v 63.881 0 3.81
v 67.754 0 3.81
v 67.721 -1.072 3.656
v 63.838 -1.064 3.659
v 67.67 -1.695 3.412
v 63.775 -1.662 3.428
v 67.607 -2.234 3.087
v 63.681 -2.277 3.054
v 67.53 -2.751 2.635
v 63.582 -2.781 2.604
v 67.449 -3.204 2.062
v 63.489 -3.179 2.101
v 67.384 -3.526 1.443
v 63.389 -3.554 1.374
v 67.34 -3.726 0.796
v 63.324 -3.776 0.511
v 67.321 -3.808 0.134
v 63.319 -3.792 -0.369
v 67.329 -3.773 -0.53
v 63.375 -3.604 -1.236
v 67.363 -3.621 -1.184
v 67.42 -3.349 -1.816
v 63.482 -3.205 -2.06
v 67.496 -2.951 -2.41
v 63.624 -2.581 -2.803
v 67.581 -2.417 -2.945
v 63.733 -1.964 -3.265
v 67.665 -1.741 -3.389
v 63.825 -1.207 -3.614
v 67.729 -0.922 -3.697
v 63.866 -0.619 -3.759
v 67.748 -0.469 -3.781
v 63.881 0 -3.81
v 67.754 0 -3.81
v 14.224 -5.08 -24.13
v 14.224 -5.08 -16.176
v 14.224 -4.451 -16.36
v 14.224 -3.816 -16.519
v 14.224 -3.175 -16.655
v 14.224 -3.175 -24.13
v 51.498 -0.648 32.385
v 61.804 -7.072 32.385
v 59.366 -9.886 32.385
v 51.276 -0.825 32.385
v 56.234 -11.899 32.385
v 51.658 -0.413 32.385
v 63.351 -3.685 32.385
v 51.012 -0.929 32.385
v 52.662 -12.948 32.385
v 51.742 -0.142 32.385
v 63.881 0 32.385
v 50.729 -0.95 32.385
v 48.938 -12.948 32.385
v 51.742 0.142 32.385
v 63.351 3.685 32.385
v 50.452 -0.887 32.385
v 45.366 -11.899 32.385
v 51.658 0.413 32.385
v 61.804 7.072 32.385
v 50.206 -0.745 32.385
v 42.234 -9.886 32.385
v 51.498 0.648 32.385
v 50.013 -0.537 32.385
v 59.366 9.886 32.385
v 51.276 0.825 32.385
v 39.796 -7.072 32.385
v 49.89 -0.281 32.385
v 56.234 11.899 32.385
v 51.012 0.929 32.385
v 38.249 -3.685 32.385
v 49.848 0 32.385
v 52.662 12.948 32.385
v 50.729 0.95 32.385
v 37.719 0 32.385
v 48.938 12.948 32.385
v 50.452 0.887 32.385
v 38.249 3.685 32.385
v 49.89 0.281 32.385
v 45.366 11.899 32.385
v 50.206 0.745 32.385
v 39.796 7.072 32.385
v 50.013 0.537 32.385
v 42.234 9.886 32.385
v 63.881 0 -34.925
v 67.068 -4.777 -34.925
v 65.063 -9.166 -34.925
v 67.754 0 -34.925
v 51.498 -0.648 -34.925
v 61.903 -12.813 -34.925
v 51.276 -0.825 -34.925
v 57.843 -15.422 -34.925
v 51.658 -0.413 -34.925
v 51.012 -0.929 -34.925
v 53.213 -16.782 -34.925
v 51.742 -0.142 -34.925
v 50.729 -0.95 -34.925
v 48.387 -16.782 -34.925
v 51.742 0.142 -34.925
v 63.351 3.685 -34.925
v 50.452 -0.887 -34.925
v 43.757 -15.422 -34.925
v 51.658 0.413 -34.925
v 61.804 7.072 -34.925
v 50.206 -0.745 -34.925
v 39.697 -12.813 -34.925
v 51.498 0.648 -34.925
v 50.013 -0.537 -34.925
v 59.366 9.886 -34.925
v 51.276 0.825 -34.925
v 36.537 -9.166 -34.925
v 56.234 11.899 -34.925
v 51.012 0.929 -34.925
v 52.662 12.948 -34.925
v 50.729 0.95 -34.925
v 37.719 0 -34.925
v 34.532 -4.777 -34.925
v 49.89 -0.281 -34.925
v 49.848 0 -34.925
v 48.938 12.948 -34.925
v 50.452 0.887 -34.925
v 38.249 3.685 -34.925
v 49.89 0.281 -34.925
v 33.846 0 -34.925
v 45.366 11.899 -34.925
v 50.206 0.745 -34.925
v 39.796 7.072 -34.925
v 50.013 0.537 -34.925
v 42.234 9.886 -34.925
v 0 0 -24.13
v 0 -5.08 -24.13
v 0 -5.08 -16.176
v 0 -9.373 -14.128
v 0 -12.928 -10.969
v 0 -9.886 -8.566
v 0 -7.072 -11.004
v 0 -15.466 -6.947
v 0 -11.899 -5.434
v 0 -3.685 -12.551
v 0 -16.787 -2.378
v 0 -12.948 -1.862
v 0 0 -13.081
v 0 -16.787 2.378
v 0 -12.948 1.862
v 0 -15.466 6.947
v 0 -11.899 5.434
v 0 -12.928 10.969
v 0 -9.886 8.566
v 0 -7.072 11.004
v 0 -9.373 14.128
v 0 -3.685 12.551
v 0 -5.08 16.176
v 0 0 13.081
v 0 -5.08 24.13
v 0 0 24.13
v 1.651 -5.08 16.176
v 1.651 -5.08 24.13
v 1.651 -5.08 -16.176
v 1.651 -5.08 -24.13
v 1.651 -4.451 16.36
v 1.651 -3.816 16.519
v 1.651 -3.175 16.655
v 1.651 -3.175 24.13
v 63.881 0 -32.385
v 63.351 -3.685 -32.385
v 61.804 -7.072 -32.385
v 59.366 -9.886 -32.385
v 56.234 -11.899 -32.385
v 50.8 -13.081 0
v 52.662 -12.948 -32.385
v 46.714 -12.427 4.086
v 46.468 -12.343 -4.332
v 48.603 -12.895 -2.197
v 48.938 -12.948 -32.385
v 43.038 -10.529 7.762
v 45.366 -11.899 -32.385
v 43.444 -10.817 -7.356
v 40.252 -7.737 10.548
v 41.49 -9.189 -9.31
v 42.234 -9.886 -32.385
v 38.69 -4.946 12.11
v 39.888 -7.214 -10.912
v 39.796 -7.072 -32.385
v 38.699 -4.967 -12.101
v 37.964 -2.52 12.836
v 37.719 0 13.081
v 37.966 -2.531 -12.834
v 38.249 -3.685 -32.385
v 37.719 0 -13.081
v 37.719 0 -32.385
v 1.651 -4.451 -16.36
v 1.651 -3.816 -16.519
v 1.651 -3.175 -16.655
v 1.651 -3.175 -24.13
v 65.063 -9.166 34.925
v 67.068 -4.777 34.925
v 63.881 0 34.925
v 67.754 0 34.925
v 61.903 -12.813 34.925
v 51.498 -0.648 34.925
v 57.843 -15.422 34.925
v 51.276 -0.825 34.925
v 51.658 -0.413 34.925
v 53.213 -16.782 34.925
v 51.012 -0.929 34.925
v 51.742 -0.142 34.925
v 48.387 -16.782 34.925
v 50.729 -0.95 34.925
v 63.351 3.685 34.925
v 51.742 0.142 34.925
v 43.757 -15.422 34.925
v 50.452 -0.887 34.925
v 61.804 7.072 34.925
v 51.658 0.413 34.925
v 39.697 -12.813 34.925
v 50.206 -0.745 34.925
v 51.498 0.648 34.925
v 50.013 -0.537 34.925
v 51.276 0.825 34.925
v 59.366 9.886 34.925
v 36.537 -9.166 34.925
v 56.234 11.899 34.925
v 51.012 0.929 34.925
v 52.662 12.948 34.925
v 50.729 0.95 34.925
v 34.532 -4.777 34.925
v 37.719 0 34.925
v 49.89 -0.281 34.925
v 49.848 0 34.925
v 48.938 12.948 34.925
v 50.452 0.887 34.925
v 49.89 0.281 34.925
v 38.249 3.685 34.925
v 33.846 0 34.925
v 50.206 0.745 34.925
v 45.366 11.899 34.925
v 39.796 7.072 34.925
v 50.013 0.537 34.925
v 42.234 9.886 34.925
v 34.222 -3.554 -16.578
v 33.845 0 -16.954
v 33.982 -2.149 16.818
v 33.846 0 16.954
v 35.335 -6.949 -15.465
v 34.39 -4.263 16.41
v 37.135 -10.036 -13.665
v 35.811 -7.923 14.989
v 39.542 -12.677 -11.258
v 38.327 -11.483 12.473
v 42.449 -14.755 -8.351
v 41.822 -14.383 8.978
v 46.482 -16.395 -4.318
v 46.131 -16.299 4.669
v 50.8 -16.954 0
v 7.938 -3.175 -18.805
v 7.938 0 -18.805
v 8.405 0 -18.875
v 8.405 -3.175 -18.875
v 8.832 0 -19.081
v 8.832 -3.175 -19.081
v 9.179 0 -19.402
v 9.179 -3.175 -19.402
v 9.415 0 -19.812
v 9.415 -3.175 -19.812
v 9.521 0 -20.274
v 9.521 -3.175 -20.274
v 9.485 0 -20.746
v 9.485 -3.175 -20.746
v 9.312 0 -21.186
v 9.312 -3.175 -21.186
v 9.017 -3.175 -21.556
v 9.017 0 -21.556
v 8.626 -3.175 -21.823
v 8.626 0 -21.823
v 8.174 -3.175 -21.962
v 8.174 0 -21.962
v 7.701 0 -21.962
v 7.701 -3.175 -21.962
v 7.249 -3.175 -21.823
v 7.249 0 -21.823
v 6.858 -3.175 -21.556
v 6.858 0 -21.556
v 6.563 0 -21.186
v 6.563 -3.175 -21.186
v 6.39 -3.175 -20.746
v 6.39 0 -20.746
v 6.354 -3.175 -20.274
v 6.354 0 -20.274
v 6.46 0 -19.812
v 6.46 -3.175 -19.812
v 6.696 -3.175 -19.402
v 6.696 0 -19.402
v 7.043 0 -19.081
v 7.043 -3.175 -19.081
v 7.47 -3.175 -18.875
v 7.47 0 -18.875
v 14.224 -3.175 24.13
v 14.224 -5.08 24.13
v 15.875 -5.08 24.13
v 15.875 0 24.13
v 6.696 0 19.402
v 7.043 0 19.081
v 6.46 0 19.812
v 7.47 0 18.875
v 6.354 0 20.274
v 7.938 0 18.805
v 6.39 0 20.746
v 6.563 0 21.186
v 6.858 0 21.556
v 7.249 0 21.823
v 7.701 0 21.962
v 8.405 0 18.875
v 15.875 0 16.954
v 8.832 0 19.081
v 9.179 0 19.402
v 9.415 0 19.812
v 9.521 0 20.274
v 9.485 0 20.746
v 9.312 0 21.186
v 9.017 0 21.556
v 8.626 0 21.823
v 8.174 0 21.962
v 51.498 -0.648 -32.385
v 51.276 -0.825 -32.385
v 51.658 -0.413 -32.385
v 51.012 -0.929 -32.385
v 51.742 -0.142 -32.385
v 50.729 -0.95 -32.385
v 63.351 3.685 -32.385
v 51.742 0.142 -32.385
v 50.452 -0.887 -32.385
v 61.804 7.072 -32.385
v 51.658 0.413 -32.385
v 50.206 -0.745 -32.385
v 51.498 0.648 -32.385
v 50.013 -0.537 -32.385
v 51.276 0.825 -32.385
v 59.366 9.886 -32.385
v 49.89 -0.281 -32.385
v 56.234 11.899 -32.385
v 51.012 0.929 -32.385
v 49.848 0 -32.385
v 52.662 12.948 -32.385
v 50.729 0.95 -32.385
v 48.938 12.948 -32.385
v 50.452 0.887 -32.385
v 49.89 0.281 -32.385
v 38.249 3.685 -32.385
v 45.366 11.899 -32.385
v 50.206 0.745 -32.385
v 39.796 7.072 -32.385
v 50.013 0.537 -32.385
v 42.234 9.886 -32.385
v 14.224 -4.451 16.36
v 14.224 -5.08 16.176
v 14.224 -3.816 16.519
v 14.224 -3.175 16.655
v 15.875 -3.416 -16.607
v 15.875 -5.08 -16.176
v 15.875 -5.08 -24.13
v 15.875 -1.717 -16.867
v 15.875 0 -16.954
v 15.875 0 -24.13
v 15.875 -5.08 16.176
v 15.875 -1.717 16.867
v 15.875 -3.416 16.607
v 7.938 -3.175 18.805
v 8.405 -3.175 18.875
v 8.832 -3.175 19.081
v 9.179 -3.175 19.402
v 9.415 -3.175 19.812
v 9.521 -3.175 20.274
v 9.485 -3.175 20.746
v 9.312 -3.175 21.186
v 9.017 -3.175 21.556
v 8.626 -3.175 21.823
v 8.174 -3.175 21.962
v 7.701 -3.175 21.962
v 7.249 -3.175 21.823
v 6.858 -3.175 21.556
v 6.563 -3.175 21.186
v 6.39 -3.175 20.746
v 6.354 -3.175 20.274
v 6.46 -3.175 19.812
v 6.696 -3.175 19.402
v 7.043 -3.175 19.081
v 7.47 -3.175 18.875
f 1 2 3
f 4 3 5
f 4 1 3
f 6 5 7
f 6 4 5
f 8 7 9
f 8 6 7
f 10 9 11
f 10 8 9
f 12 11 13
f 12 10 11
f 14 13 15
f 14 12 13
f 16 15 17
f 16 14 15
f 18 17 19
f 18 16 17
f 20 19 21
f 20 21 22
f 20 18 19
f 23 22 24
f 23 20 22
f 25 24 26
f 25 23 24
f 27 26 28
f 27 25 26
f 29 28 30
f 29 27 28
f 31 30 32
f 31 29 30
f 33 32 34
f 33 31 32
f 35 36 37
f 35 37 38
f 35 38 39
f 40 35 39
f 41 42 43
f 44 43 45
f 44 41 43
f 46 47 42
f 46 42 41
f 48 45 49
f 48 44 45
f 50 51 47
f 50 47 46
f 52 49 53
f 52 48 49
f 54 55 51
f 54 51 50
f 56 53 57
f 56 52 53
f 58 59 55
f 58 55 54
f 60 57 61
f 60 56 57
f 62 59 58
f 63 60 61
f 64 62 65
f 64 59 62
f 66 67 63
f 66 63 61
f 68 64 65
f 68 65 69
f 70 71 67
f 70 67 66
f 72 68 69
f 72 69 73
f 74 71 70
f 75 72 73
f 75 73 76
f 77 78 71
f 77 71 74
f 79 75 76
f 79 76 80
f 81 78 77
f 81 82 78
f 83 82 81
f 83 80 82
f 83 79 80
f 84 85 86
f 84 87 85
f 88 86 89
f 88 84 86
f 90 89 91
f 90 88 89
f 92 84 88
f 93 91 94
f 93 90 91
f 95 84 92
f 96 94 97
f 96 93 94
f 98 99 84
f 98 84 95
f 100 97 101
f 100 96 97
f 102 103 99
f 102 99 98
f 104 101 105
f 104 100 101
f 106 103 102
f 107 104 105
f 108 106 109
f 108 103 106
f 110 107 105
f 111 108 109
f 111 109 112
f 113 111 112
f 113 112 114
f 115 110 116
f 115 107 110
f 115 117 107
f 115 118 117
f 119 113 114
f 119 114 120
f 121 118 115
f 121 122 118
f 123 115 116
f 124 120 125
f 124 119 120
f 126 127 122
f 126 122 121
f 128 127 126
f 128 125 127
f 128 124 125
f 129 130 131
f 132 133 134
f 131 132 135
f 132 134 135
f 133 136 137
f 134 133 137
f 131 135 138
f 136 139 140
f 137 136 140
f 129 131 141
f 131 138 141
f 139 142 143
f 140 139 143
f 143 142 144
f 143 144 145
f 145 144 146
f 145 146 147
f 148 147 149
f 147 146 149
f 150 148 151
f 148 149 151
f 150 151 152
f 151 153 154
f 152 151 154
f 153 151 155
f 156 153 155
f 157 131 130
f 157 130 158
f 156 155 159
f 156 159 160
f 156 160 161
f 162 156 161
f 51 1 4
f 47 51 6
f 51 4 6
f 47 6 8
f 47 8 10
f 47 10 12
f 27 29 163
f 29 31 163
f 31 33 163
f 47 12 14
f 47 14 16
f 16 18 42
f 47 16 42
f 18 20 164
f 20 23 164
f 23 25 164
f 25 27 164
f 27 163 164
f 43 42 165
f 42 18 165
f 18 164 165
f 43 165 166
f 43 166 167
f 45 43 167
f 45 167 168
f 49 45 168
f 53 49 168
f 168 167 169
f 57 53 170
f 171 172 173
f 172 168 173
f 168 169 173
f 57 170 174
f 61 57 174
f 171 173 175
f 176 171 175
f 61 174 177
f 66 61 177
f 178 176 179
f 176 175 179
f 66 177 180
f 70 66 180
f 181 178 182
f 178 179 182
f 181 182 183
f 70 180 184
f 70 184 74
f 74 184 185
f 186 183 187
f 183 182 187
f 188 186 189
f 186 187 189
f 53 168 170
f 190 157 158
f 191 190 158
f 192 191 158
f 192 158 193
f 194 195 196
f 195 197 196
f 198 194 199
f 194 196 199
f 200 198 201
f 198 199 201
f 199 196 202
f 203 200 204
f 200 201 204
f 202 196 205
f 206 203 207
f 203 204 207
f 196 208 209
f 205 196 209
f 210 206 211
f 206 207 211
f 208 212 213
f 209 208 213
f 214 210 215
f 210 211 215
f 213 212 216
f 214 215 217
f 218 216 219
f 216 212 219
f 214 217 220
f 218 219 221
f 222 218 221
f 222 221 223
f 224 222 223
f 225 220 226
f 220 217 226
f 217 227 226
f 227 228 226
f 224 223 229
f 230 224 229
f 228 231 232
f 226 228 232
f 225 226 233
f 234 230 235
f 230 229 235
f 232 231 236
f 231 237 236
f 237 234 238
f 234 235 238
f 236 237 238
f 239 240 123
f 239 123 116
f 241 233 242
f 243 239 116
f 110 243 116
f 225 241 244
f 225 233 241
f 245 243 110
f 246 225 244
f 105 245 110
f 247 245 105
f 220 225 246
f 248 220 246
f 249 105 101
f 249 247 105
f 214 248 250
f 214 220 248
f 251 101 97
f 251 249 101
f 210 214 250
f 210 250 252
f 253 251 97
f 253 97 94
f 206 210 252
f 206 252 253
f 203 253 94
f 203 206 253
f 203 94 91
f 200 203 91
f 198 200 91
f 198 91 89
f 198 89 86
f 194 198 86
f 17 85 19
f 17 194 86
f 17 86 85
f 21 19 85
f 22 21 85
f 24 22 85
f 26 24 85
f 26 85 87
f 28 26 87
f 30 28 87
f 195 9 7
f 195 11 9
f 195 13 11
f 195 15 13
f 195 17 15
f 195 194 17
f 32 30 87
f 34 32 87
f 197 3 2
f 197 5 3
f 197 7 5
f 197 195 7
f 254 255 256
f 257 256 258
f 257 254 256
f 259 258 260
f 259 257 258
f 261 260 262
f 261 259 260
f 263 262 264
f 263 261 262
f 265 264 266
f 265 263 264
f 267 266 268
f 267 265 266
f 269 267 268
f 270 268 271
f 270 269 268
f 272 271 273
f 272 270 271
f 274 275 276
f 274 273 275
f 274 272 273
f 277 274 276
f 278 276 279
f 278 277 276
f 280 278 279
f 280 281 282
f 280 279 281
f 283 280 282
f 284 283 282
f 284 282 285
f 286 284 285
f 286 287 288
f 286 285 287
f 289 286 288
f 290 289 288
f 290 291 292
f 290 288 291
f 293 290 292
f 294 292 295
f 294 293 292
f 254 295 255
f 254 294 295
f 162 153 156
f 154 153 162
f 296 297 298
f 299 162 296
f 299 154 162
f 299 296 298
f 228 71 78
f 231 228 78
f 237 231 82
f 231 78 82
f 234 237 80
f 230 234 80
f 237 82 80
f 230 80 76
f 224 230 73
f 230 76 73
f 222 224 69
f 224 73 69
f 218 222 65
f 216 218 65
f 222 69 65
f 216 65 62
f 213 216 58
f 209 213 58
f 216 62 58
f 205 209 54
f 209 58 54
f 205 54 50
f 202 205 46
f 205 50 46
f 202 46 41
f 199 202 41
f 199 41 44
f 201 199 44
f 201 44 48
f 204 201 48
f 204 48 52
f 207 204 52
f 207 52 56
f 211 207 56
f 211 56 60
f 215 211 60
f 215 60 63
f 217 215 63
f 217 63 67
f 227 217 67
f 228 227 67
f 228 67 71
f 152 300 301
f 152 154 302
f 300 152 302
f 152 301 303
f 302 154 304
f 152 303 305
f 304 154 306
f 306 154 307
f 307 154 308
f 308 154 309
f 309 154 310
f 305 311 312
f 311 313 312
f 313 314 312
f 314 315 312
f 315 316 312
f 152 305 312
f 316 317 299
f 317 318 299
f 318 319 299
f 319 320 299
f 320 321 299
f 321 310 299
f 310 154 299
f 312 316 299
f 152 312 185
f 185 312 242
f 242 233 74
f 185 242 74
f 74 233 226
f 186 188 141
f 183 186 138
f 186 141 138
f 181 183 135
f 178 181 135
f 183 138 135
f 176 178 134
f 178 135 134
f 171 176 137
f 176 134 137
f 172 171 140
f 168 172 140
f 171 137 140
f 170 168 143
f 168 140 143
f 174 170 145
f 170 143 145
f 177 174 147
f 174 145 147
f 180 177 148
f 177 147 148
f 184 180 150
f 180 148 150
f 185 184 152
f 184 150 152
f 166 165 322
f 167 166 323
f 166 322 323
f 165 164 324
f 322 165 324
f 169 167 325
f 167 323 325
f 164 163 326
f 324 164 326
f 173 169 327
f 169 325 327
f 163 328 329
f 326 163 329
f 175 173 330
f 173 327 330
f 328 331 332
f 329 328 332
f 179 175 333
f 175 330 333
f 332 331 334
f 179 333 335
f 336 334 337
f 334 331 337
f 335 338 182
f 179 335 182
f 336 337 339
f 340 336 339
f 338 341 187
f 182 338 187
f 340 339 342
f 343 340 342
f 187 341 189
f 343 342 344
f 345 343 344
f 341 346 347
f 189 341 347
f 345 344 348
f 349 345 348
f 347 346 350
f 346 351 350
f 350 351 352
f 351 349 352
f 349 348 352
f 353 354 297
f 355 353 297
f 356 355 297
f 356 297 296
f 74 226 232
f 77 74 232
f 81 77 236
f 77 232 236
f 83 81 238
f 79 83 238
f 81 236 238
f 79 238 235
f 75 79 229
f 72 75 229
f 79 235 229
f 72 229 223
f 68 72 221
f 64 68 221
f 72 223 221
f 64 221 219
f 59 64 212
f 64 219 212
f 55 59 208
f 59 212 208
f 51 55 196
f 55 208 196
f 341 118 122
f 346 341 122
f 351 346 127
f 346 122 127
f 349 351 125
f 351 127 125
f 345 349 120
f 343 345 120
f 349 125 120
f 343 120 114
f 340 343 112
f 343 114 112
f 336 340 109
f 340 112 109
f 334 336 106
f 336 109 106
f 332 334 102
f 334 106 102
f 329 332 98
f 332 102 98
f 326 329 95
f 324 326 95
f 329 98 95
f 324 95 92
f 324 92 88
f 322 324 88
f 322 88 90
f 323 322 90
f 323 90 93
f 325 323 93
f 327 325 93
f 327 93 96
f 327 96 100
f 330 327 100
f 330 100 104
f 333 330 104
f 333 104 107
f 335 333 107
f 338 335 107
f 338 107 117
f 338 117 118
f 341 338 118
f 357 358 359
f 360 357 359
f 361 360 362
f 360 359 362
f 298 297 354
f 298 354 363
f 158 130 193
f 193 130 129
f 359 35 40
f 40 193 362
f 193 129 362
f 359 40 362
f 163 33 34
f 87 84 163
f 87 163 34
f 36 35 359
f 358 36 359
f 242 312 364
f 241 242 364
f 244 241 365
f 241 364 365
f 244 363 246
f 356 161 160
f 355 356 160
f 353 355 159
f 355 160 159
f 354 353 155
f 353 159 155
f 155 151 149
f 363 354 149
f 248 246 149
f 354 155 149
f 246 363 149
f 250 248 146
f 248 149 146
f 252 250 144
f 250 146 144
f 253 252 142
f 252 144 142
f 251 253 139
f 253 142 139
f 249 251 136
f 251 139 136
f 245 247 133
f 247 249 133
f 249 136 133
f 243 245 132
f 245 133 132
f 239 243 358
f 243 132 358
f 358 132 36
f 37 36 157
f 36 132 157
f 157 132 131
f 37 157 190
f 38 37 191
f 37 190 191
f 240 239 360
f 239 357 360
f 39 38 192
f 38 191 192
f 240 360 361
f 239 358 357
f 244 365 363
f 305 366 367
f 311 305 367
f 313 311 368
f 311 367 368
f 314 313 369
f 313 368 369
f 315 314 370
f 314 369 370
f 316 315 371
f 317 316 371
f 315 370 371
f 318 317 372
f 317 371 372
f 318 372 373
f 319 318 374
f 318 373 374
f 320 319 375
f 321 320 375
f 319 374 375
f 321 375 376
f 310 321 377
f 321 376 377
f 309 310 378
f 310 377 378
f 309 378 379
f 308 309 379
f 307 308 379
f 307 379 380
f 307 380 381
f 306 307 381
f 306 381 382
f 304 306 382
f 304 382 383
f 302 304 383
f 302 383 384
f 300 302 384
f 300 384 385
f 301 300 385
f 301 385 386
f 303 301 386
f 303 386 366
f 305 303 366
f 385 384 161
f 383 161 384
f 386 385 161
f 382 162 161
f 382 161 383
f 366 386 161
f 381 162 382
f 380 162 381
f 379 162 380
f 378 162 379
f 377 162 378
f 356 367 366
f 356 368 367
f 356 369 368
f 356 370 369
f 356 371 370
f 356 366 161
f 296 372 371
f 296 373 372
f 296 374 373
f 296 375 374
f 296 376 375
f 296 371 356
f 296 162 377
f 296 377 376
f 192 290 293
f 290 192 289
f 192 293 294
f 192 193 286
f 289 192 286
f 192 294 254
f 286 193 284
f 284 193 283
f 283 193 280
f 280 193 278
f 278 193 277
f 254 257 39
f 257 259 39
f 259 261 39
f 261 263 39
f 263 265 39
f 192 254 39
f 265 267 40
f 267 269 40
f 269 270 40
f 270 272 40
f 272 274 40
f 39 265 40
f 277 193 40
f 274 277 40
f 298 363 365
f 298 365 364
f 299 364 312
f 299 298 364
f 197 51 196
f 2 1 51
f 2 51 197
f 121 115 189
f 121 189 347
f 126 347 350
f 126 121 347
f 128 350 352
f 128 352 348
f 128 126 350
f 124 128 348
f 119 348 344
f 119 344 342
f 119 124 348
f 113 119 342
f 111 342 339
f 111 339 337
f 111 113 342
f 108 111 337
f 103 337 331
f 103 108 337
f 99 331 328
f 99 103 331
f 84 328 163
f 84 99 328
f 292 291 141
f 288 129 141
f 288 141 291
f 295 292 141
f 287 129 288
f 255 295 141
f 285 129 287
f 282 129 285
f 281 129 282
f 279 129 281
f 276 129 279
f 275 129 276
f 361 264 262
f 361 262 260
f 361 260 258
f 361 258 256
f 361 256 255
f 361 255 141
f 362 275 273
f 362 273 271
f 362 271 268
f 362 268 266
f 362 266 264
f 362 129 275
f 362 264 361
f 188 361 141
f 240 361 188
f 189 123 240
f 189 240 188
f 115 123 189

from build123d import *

# Parameters (mm, degrees)
SKETCH1_R                = 16.9545
BOSS_EXTRUDE1_DEPTH      = 50.8
SKETCH2_R                = 16.9545
BOSS_EXTRUDE2_DEPTH      = 34.925
SKETCH3_R                = 13.081
CUT_EXTRUDE1_DEPTH       = 50.8
SKETCH5_R                = 13.081
CUT_EXTRUDE2_DEPTH       = 69.85
CUT_EXTRUDE4_DEPTH       = 79.088942658
CUT_EXTRUDE4_DEPTH_BACK  = 79.088942658
SKETCH6_R                = 3.81
BOSS_EXTRUDE3_REACH      = 93.464
BOSS_EXTRUDE3_END_RADIUS = 16.9545
SKETCH8_W                = 15.875
SKETCH8_H                = 5.08
CUT_EXTRUDE5_REACH       = 93.464
CUT_EXTRUDE5_END_RADIUS  = 16.9545
SKETCH9_W                = 12.573
SKETCH9_H                = 1.905
SKETCH10_R               = 1.5875
CUT_EXTRUDE6_DEPTH       = 78.461619779
SKETCH11_R               = 13.081
BOSS_EXTRUDE4_DEPTH      = 2.54
SKETCH13_R               = 0.9525
CUT_EXTRUDE8_DEPTH       = 99.778286437


with BuildPart() as part:
    # Sketch1 → Boss-Extrude1 (new body)
    with BuildSketch(Plane(origin=(0, 0, 0), x_dir=(0, 0, -1), z_dir=(1, 0, 0))):
        Circle(SKETCH1_R)
    extrude(amount=BOSS_EXTRUDE1_DEPTH)

    # Sketch2 → Boss-Extrude2 (add, symmetric)
    with BuildSketch(Plane.XY):
        with Locations((50.8, 0)):
            Circle(SKETCH2_R)
    extrude(amount=BOSS_EXTRUDE2_DEPTH, both=True)

    # Sketch3 → Cut-Extrude1 (cut)
    with BuildSketch(Plane.ZY):
        Circle(SKETCH3_R)
    extrude(amount=-CUT_EXTRUDE1_DEPTH, mode=Mode.SUBTRACT)

    # Sketch5 → Cut-Extrude2 (cut)
    with BuildSketch(Plane(origin=(0, 0, -34.925), x_dir=(-1, 0, 0), z_dir=(0, 0, -1))):
        with Locations((-50.8, 0)):
            Circle(SKETCH5_R)
    extrude(amount=-CUT_EXTRUDE2_DEPTH, mode=Mode.SUBTRACT)

    # Sketch6 → Cut-Extrude4 (cut, two sides: drawn at the far end of the back side and taken through both)
    with BuildSketch(Plane(origin=(0, 0, 0), x_dir=(0, 0, -1), z_dir=(1, 0, 0)).offset(-CUT_EXTRUDE4_DEPTH_BACK)):
        with Locations(Location((0, 0, 0), (0, 0, 180))):
            Circle(SKETCH6_R)
    extrude(amount=CUT_EXTRUDE4_DEPTH + CUT_EXTRUDE4_DEPTH_BACK, mode=Mode.SUBTRACT)

    # SurfaceCut1
    split(bisect_by=Plane(origin=(0, 0, 0), x_dir=(1, 0, 0), z_dir=(0, 1, 0)), keep=Keep.BOTTOM)


with BuildPart() as body_2:
    # Boss-Extrude3: up to this cylinder (the profile starts outside it)
    boss_extrude3_end = Plane(origin=(7.9375, 0, 0), z_dir=(-1, 0, 0)) * Cylinder(BOSS_EXTRUDE3_END_RADIUS, 221.837, mode=Mode.PRIVATE)
    # Sketch8 → Boss-Extrude3 (new, up to the surface)
    with BuildSketch(Plane.XY.offset(24.13), mode=Mode.PRIVATE) as boss_extrude3_sk1:
        with Locations((7.9375, -2.54)):
            Rectangle(SKETCH8_W, SKETCH8_H)
    boss_extrude3_tool1 = extrude(boss_extrude3_sk1.sketch, amount=-BOSS_EXTRUDE3_REACH, mode=Mode.PRIVATE) - boss_extrude3_end
    add(boss_extrude3_tool1.solids().sort_by_distance((7.9375, -2.54, 24.13))[0])

    # Cut-Extrude5: up to this cylinder (the profile starts outside it)
    cut_extrude5_end = Plane(origin=(7.9375, 0, 0), z_dir=(-1, 0, 0)) * Cylinder(CUT_EXTRUDE5_END_RADIUS, 221.837, mode=Mode.PRIVATE)
    # Sketch9 → Cut-Extrude5 (cut, up to the surface)
    with BuildSketch(Plane.XY.offset(24.13), mode=Mode.PRIVATE) as cut_extrude5_sk1:
        with Locations((7.9375, -4.1275)):
            Rectangle(SKETCH9_W, SKETCH9_H)
    cut_extrude5_tool1 = extrude(cut_extrude5_sk1.sketch, amount=-CUT_EXTRUDE5_REACH, mode=Mode.PRIVATE) - cut_extrude5_end
    add(cut_extrude5_tool1.solids().sort_by_distance((7.9375, -4.1275, 24.13))[0], mode=Mode.SUBTRACT)


with BuildPart() as body_3:
    # Mirror1: mirrored copy
    add(body_2.part.mirror(Plane.XY))


with BuildPart() as part_1:
    add(part.part)

    # Intersect1: read off the stored shape, not the designer's step
    # Intersect1: union body 3, body 2
    add(body_3.part)
    add(body_2.part)

    # Sketch10 → Cut-Extrude6 (cut, through all)
    with BuildSketch(Plane.XZ.offset(3.175)):
        with Locations(Location((7.9375, 20.392281148, 0), (0, 0, 270))):
            Circle(SKETCH10_R)
    cut_extrude6 = extrude(amount=-CUT_EXTRUDE6_DEPTH, mode=Mode.SUBTRACT)

    # Mirror2: Cut-Extrude6 across plane
    add(cut_extrude6.mirror(Plane.XY), mode=Mode.SUBTRACT)

    # Sketch11 → Boss-Extrude4 (add)
    with BuildSketch(Plane(origin=(0, 0, -34.925), x_dir=(-1, 0, 0), z_dir=(0, 0, -1))):
        with Locations((-50.8, 0)):
            Circle(SKETCH11_R)
    boss_extrude4 = extrude(amount=-BOSS_EXTRUDE4_DEPTH)

    # Mirror3: Boss-Extrude4 across plane
    add(boss_extrude4.mirror(Plane.XY))

    # Sketch13 → Cut-Extrude8 (cut, through all)
    with BuildSketch(Plane(origin=(0, 0, -34.925), x_dir=(-1, 0, 0), z_dir=(0, 0, -1))):
        with Locations((-50.8, 0)):
            Circle(SKETCH13_R)
    extrude(amount=-CUT_EXTRUDE8_DEPTH, mode=Mode.SUBTRACT)


solid = part_1.part
